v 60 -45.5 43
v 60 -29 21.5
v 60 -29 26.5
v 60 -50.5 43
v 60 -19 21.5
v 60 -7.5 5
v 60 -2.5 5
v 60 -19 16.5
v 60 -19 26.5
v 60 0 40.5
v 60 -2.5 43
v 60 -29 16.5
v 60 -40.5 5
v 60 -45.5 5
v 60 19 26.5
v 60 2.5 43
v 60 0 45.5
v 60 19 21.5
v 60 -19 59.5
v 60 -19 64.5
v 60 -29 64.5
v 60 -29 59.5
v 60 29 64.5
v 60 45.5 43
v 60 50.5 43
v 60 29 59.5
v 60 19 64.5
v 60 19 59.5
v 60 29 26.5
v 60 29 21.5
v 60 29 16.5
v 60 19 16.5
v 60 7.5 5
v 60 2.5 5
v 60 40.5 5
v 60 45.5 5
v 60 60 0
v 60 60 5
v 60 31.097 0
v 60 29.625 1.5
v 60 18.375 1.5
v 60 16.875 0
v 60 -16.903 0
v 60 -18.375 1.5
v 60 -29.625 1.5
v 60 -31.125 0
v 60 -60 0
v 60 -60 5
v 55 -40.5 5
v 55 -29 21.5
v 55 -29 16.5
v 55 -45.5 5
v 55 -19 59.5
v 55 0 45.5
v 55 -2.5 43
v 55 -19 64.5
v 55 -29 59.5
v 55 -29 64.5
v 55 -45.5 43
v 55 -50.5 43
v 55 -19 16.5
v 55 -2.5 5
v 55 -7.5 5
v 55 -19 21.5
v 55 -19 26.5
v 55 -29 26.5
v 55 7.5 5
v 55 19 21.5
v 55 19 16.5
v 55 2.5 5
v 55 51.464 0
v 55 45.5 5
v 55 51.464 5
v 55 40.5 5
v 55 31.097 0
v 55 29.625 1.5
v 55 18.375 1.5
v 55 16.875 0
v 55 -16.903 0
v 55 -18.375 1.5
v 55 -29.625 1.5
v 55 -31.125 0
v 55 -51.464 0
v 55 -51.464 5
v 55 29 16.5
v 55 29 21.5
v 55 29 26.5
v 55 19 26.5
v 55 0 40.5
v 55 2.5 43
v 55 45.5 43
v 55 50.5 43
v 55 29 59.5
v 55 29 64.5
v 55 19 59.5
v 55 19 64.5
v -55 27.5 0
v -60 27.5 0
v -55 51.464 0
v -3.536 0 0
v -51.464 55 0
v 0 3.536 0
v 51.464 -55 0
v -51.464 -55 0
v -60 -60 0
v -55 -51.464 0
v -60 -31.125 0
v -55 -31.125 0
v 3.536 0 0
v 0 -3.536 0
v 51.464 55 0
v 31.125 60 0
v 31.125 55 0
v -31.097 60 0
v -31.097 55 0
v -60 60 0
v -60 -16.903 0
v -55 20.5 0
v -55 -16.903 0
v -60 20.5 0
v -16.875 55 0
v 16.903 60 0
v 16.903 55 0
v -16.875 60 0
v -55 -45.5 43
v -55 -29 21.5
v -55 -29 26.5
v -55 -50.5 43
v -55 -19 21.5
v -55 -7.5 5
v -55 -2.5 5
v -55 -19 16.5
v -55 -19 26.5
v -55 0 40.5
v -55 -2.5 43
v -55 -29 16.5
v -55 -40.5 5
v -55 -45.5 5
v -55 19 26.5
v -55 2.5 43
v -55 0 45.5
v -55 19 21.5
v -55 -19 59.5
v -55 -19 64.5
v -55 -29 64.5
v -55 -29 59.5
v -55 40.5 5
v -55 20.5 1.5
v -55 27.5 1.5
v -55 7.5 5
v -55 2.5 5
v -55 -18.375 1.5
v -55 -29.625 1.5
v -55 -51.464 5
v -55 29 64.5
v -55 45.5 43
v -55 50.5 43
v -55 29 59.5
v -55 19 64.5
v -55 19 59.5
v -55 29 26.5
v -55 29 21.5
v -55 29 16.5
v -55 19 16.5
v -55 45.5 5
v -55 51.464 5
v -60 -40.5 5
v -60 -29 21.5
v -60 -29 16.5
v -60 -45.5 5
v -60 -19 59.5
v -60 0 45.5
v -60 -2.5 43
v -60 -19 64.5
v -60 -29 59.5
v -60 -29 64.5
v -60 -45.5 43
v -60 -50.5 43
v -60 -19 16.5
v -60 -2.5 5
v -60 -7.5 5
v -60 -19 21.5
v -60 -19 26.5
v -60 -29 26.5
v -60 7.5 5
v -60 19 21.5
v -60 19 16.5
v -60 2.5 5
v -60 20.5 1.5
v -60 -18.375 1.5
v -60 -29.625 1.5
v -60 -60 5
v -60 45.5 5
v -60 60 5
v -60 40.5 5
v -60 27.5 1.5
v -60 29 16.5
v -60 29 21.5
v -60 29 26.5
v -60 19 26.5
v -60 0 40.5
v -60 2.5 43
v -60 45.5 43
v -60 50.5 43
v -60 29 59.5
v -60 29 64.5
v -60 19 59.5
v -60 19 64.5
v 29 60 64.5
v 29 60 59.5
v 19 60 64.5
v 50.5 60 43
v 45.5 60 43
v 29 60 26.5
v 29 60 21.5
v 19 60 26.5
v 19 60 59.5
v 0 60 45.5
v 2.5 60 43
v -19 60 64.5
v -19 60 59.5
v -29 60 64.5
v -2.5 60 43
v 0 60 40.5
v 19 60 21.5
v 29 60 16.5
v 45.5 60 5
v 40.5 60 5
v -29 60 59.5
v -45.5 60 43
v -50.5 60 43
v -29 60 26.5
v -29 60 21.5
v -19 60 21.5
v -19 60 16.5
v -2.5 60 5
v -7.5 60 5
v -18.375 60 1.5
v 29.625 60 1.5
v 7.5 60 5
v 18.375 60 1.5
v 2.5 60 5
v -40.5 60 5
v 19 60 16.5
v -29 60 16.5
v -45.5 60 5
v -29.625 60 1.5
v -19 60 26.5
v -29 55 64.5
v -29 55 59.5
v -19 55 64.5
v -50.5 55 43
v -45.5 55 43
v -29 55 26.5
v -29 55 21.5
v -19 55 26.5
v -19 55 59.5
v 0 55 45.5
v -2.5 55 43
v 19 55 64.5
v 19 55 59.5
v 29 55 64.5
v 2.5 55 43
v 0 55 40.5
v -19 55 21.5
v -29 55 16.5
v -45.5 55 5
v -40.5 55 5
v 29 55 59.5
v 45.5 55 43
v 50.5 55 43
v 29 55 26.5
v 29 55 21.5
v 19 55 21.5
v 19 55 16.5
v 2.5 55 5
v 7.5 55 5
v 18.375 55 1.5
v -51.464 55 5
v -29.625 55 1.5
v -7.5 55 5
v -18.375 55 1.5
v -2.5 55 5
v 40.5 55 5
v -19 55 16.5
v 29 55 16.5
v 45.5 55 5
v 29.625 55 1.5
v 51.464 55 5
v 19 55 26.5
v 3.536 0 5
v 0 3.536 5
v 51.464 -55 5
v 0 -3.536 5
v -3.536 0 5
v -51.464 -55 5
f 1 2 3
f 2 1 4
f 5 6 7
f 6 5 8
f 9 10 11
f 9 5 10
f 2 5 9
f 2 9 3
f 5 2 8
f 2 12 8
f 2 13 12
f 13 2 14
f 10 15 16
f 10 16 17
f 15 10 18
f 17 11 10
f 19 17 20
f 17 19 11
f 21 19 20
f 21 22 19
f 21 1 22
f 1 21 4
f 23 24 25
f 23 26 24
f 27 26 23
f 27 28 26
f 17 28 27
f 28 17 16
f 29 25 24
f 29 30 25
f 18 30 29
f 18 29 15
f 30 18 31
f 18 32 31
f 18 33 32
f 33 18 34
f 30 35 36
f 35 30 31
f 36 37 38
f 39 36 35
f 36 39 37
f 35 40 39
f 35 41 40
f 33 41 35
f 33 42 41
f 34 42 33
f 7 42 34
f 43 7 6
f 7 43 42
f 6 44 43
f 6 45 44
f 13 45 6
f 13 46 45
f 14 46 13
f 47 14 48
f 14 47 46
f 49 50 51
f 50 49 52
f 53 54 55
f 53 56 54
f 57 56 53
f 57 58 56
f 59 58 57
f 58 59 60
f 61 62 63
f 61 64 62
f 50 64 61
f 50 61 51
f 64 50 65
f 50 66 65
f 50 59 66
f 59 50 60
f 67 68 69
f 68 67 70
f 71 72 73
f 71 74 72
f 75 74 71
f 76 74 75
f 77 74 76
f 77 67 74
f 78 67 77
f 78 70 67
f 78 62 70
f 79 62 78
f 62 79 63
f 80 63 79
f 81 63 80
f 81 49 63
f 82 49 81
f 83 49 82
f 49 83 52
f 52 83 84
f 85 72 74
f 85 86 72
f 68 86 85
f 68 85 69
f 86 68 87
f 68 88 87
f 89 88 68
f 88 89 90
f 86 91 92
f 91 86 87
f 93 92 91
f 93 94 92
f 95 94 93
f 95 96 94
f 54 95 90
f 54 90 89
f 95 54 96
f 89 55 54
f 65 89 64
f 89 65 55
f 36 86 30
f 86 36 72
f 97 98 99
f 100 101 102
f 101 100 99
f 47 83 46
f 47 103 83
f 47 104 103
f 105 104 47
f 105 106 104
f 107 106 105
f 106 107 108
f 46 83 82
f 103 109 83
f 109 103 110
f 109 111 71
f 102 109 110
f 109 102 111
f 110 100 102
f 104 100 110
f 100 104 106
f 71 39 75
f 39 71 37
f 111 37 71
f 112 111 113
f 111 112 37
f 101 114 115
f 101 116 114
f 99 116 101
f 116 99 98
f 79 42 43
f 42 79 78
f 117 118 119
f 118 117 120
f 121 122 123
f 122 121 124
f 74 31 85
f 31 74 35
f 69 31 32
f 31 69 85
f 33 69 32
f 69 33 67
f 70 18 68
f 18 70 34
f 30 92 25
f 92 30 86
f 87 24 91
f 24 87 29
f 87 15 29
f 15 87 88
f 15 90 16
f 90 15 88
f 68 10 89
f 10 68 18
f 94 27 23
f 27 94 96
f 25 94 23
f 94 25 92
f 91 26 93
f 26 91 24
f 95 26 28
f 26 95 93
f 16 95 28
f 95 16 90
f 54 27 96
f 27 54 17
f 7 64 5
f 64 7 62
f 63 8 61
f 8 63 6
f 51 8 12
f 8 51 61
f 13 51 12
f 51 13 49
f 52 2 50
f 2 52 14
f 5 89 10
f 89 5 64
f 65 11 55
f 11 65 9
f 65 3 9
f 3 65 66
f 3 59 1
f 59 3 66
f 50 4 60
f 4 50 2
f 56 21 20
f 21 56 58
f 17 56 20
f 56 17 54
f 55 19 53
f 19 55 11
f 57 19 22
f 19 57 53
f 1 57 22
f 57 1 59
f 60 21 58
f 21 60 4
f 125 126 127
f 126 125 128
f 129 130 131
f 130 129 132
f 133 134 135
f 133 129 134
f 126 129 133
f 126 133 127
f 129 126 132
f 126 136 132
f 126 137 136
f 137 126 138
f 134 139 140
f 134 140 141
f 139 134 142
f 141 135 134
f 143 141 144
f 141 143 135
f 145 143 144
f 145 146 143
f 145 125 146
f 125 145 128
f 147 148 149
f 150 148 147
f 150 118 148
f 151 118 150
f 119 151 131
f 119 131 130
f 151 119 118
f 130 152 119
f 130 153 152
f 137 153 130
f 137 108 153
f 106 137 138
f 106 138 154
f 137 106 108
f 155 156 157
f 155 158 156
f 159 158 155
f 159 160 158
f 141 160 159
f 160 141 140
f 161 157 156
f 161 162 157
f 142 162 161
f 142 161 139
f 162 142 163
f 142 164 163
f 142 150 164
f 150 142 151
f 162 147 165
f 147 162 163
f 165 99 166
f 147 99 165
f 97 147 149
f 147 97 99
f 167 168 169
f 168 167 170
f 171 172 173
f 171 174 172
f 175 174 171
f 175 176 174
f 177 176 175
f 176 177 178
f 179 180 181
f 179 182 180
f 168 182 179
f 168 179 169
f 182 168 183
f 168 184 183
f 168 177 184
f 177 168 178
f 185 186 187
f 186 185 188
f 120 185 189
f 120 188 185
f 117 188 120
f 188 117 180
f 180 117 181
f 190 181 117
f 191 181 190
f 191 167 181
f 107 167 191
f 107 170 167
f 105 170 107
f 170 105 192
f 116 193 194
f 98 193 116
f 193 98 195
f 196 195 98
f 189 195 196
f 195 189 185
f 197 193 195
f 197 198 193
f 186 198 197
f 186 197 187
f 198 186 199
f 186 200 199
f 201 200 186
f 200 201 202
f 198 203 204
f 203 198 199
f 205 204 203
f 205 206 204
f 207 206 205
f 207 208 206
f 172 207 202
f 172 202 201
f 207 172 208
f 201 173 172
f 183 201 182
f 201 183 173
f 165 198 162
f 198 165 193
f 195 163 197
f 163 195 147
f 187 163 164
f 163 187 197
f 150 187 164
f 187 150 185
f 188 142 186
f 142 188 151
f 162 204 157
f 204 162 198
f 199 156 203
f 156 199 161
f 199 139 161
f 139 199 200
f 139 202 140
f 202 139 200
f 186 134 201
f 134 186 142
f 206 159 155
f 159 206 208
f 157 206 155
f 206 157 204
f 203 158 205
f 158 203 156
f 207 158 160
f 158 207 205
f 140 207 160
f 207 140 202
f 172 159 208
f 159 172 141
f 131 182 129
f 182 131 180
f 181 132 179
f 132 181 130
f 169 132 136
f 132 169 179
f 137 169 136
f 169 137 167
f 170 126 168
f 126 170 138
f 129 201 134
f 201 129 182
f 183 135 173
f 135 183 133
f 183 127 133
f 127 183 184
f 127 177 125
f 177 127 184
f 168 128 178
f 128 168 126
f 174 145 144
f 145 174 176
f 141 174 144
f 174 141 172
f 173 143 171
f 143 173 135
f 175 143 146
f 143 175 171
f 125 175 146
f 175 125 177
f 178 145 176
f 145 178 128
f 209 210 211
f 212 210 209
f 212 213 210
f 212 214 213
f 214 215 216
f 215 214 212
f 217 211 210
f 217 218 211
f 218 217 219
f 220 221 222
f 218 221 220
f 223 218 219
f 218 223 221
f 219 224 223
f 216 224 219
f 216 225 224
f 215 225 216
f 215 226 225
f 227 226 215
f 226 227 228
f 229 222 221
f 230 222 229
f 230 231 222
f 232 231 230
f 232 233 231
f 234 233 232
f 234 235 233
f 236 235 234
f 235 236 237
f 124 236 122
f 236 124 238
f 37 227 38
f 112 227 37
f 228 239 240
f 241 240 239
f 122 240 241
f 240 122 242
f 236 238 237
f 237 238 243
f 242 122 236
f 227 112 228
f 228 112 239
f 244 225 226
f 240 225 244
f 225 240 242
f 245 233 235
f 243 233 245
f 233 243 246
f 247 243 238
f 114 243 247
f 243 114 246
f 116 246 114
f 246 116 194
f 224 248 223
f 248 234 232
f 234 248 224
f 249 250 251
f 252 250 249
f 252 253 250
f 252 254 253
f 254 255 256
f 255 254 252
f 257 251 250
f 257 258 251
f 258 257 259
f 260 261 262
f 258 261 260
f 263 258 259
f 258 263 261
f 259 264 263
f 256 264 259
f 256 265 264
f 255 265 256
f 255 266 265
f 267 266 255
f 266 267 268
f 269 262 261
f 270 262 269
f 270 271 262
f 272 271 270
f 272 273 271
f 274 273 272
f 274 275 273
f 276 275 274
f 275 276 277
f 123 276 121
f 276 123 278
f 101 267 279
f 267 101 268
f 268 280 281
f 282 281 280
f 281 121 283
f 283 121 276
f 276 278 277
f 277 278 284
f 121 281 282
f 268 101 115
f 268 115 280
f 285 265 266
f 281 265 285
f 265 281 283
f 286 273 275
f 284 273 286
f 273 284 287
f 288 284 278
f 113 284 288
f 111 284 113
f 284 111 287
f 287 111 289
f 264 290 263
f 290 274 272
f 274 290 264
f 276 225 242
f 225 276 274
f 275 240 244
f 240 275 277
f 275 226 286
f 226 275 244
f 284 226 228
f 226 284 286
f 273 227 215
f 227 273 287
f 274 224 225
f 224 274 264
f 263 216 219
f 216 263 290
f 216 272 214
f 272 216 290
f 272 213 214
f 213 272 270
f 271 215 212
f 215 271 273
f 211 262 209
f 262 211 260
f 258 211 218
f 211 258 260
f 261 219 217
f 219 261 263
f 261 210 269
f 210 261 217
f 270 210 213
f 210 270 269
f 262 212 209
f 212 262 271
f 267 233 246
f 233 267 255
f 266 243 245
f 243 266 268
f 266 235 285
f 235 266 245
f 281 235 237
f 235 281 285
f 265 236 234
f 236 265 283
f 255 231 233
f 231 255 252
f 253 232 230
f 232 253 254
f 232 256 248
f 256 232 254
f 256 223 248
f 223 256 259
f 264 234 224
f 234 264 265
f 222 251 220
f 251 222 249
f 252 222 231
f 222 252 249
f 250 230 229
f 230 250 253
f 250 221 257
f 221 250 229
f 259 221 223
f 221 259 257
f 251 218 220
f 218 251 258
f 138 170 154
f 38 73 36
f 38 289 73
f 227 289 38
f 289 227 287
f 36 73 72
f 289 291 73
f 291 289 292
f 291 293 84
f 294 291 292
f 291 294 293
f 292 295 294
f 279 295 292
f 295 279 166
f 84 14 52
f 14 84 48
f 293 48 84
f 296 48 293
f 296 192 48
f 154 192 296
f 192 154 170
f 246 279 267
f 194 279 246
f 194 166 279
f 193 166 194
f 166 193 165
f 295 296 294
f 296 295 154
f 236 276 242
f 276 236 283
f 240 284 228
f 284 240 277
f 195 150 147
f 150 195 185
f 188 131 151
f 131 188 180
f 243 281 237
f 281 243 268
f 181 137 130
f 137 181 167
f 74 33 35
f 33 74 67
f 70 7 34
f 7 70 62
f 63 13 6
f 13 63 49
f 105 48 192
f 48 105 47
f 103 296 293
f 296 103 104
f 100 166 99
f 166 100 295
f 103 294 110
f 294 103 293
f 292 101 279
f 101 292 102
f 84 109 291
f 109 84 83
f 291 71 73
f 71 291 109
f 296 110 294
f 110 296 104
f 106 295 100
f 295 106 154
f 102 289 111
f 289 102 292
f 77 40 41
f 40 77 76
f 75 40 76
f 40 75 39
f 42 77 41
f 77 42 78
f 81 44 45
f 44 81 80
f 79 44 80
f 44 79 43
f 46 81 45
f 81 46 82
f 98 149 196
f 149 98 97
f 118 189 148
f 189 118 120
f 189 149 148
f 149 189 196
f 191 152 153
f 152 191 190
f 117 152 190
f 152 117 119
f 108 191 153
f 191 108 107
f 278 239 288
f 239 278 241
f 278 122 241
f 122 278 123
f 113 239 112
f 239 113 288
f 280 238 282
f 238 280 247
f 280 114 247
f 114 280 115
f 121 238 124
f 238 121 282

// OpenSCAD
$fn=64;
difference(){union(){translate(v = [-57.5, 0])
translate(v = [-2.5, -60.0])
cube(size = [5, 120, 5]);
translate(v = [57.5, 0])
translate(v = [-2.5, -60.0])
cube(size = [5, 120, 5]);
translate(v = [0, -57.5])
rotate(a = [0, 0, 90])
translate(v = [-2.5, -60.0])
cube(size = [5, 120, 5]);
translate(v = [0, 57.5])
rotate(a = [0, 0, 90])
translate(v = [-2.5, -60.0])
cube(size = [5, 120, 5]);
rotate(a = [0, 0, 45])
translate(v = [-2.5, -77.78174593052023])
cube(size = [5, 155.56349186104046, 5]);
rotate(a = [0, 0, -45])
translate(v = [-2.5, -77.78174593052023])
cube(size = [5, 155.56349186104046, 5]);
translate(v = [57.5, 24.0])
union(){translate(v = [0, 0, 0.0])
translate(v = [2.5, -26.5])
rotate(a = [0, -90, 0])
linear_extrude(height = 5){polygon(points = [[0, 0], [21.5, 21.5], [21.5, 31.5], [0, 53.0], [0, 48.0], [16.5, 31.5], [16.5, 21.5], [0, 5], [0, 0]]);
}
translate(v = [0, 0, 21.5])
translate(v = [2.5, -26.5])
translate(v = [-5, 0, 21.5])
rotate(a = [0, 180, 0])
rotate(a = [0, -90, 0])
linear_extrude(height = 5){polygon(points = [[0, 0], [21.5, 21.5], [21.5, 31.5], [0, 53.0], [0, 48.0], [16.5, 31.5], [16.5, 21.5], [0, 5], [0, 0]]);
}
translate(v = [0, 0, 43.0])
translate(v = [2.5, -26.5])
rotate(a = [0, -90, 0])
linear_extrude(height = 5){polygon(points = [[0, 0], [21.5, 21.5], [21.5, 31.5], [0, 53.0], [0, 48.0], [16.5, 31.5], [16.5, 21.5], [0, 5], [0, 0]]);
}
}
translate(v = [57.5, -24.0])
union(){translate(v = [0, 0, 0.0])
translate(v = [2.5, -26.5])
rotate(a = [0, -90, 0])
linear_extrude(height = 5){polygon(points = [[0, 0], [21.5, 21.5], [21.5, 31.5], [0, 53.0], [0, 48.0], [16.5, 31.5], [16.5, 21.5], [0, 5], [0, 0]]);
}
translate(v = [0, 0, 21.5])
translate(v = [2.5, -26.5])
translate(v = [-5, 0, 21.5])
rotate(a = [0, 180, 0])
rotate(a = [0, -90, 0])
linear_extrude(height = 5){polygon(points = [[0, 0], [21.5, 21.5], [21.5, 31.5], [0, 53.0], [0, 48.0], [16.5, 31.5], [16.5, 21.5], [0, 5], [0, 0]]);
}
translate(v = [0, 0, 43.0])
translate(v = [2.5, -26.5])
rotate(a = [0, -90, 0])
linear_extrude(height = 5){polygon(points = [[0, 0], [21.5, 21.5], [21.5, 31.5], [0, 53.0], [0, 48.0], [16.5, 31.5], [16.5, 21.5], [0, 5], [0, 0]]);
}
}
translate(v = [-57.5, 24.0])
union(){translate(v = [0, 0, 0.0])
translate(v = [2.5, -26.5])
rotate(a = [0, -90, 0])
linear_extrude(height = 5){polygon(points = [[0, 0], [21.5, 21.5], [21.5, 31.5], [0, 53.0], [0, 48.0], [16.5, 31.5], [16.5, 21.5], [0, 5], [0, 0]]);
}
translate(v = [0, 0, 21.5])
translate(v = [2.5, -26.5])
translate(v = [-5, 0, 21.5])
rotate(a = [0, 180, 0])
rotate(a = [0, -90, 0])
linear_extrude(height = 5){polygon(points = [[0, 0], [21.5, 21.5], [21.5, 31.5], [0, 53.0], [0, 48.0], [16.5, 31.5], [16.5, 21.5], [0, 5], [0, 0]]);
}
translate(v = [0, 0, 43.0])
translate(v = [2.5, -26.5])
rotate(a = [0, -90, 0])
linear_extrude(height = 5){polygon(points = [[0, 0], [21.5, 21.5], [21.5, 31.5], [0, 53.0], [0, 48.0], [16.5, 31.5], [16.5, 21.5], [0, 5], [0, 0]]);
}
}
translate(v = [-57.5, -24.0])
union(){translate(v = [0, 0, 0.0])
translate(v = [2.5, -26.5])
rotate(a = [0, -90, 0])
linear_extrude(height = 5){polygon(points = [[0, 0], [21.5, 21.5], [21.5, 31.5], [0, 53.0], [0, 48.0], [16.5, 31.5], [16.5, 21.5], [0, 5], [0, 0]]);
}
translate(v = [0, 0, 21.5])
translate(v = [2.5, -26.5])
translate(v = [-5, 0, 21.5])
rotate(a = [0, 180, 0])
rotate(a = [0, -90, 0])
linear_extrude(height = 5){polygon(points = [[0, 0], [21.5, 21.5], [21.5, 31.5], [0, 53.0], [0, 48.0], [16.5, 31.5], [16.5, 21.5], [0, 5], [0, 0]]);
}
translate(v = [0, 0, 43.0])
translate(v = [2.5, -26.5])
rotate(a = [0, -90, 0])
linear_extrude(height = 5){polygon(points = [[0, 0], [21.5, 21.5], [21.5, 31.5], [0, 53.0], [0, 48.0], [16.5, 31.5], [16.5, 21.5], [0, 5], [0, 0]]);
}
}
translate(v = [24.0, 57.5])
rotate(a = [0, 0, 90])
union(){translate(v = [0, 0, 0.0])
translate(v = [2.5, -26.5])
rotate(a = [0, -90, 0])
linear_extrude(height = 5){polygon(points = [[0, 0], [21.5, 21.5], [21.5, 31.5], [0, 53.0], [0, 48.0], [16.5, 31.5], [16.5, 21.5], [0, 5], [0, 0]]);
}
translate(v = [0, 0, 21.5])
translate(v = [2.5, -26.5])
translate(v = [-5, 0, 21.5])
rotate(a = [0, 180, 0])
rotate(a = [0, -90, 0])
linear_extrude(height = 5){polygon(points = [[0, 0], [21.5, 21.5], [21.5, 31.5], [0, 53.0], [0, 48.0], [16.5, 31.5], [16.5, 21.5], [0, 5], [0, 0]]);
}
translate(v = [0, 0, 43.0])
translate(v = [2.5, -26.5])
rotate(a = [0, -90, 0])
linear_extrude(height = 5){polygon(points = [[0, 0], [21.5, 21.5], [21.5, 31.5], [0, 53.0], [0, 48.0], [16.5, 31.5], [16.5, 21.5], [0, 5], [0, 0]]);
}
}
translate(v = [-24.0, 57.5])
rotate(a = [0, 0, 90])
union(){translate(v = [0, 0, 0.0])
translate(v = [2.5, -26.5])
rotate(a = [0, -90, 0])
linear_extrude(height = 5){polygon(points = [[0, 0], [21.5, 21.5], [21.5, 31.5], [0, 53.0], [0, 48.0], [16.5, 31.5], [16.5, 21.5], [0, 5], [0, 0]]);
}
translate(v = [0, 0, 21.5])
translate(v = [2.5, -26.5])
translate(v = [-5, 0, 21.5])
rotate(a = [0, 180, 0])
rotate(a = [0, -90, 0])
linear_extrude(height = 5){polygon(points = [[0, 0], [21.5, 21.5], [21.5, 31.5], [0, 53.0], [0, 48.0], [16.5, 31.5], [16.5, 21.5], [0, 5], [0, 0]]);
}
translate(v = [0, 0, 43.0])
translate(v = [2.5, -26.5])
rotate(a = [0, -90, 0])
linear_extrude(height = 5){polygon(points = [[0, 0], [21.5, 21.5], [21.5, 31.5], [0, 53.0], [0, 48.0], [16.5, 31.5], [16.5, 21.5], [0, 5], [0, 0]]);
}
}
}
translate(v = [57.5, 24.0, -65])
union(){translate(v = [0, 0, 0.0])
translate(v = [3.5, -72.125])
rotate(a = [0, -90, 0])
linear_extrude(height = 7){polygon(points = [[0, 0], [66.5, 66.5], [66.5, 77.75], [0, 143.0], [0, 138.0], [61.5, 77.75], [61.5, 66.5], [0, 5], [0, 0]]);
}
}
translate(v = [57.5, -24.0, -65])
union(){translate(v = [0, 0, 0.0])
translate(v = [3.5, -72.125])
rotate(a = [0, -90, 0])
linear_extrude(height = 7){polygon(points = [[0, 0], [66.5, 66.5], [66.5, 77.75], [0, 143.0], [0, 138.0], [61.5, 77.75], [61.5, 66.5], [0, 5], [0, 0]]);
}
}
translate(v = [-57.5, 24.0, -65])
rotate(a = [0, 0, 90])
union(){translate(v = [0, 0, 0.0])
translate(v = [3.5, -72.125])
rotate(a = [0, -90, 0])
linear_extrude(height = 7){polygon(points = [[0, 0], [66.5, 66.5], [66.5, 77.75], [0, 143.0], [0, 138.0], [61.5, 77.75], [61.5, 66.5], [0, 5], [0, 0]]);
}
}
translate(v = [-57.5, -24.0, -65])
union(){translate(v = [0, 0, 0.0])
translate(v = [3.5, -72.125])
rotate(a = [0, -90, 0])
linear_extrude(height = 7){polygon(points = [[0, 0], [66.5, 66.5], [66.5, 77.75], [0, 143.0], [0, 138.0], [61.5, 77.75], [61.5, 66.5], [0, 5], [0, 0]]);
}
}
translate(v = [24.0, 57.5, -65])
rotate(a = [0, 0, 90])
union(){translate(v = [0, 0, 0.0])
translate(v = [3.5, -72.125])
rotate(a = [0, -90, 0])
linear_extrude(height = 7){polygon(points = [[0, 0], [66.5, 66.5], [66.5, 77.75], [0, 143.0], [0, 138.0], [61.5, 77.75], [61.5, 66.5], [0, 5], [0, 0]]);
}
}
translate(v = [-24.0, 57.5, -65])
rotate(a = [0, 0, 90])
union(){translate(v = [0, 0, 0.0])
translate(v = [3.5, -72.125])
rotate(a = [0, -90, 0])
linear_extrude(height = 7){polygon(points = [[0, 0], [66.5, 66.5], [66.5, 77.75], [0, 143.0], [0, 138.0], [61.5, 77.75], [61.5, 66.5], [0, 5], [0, 0]]);
}
}
}
